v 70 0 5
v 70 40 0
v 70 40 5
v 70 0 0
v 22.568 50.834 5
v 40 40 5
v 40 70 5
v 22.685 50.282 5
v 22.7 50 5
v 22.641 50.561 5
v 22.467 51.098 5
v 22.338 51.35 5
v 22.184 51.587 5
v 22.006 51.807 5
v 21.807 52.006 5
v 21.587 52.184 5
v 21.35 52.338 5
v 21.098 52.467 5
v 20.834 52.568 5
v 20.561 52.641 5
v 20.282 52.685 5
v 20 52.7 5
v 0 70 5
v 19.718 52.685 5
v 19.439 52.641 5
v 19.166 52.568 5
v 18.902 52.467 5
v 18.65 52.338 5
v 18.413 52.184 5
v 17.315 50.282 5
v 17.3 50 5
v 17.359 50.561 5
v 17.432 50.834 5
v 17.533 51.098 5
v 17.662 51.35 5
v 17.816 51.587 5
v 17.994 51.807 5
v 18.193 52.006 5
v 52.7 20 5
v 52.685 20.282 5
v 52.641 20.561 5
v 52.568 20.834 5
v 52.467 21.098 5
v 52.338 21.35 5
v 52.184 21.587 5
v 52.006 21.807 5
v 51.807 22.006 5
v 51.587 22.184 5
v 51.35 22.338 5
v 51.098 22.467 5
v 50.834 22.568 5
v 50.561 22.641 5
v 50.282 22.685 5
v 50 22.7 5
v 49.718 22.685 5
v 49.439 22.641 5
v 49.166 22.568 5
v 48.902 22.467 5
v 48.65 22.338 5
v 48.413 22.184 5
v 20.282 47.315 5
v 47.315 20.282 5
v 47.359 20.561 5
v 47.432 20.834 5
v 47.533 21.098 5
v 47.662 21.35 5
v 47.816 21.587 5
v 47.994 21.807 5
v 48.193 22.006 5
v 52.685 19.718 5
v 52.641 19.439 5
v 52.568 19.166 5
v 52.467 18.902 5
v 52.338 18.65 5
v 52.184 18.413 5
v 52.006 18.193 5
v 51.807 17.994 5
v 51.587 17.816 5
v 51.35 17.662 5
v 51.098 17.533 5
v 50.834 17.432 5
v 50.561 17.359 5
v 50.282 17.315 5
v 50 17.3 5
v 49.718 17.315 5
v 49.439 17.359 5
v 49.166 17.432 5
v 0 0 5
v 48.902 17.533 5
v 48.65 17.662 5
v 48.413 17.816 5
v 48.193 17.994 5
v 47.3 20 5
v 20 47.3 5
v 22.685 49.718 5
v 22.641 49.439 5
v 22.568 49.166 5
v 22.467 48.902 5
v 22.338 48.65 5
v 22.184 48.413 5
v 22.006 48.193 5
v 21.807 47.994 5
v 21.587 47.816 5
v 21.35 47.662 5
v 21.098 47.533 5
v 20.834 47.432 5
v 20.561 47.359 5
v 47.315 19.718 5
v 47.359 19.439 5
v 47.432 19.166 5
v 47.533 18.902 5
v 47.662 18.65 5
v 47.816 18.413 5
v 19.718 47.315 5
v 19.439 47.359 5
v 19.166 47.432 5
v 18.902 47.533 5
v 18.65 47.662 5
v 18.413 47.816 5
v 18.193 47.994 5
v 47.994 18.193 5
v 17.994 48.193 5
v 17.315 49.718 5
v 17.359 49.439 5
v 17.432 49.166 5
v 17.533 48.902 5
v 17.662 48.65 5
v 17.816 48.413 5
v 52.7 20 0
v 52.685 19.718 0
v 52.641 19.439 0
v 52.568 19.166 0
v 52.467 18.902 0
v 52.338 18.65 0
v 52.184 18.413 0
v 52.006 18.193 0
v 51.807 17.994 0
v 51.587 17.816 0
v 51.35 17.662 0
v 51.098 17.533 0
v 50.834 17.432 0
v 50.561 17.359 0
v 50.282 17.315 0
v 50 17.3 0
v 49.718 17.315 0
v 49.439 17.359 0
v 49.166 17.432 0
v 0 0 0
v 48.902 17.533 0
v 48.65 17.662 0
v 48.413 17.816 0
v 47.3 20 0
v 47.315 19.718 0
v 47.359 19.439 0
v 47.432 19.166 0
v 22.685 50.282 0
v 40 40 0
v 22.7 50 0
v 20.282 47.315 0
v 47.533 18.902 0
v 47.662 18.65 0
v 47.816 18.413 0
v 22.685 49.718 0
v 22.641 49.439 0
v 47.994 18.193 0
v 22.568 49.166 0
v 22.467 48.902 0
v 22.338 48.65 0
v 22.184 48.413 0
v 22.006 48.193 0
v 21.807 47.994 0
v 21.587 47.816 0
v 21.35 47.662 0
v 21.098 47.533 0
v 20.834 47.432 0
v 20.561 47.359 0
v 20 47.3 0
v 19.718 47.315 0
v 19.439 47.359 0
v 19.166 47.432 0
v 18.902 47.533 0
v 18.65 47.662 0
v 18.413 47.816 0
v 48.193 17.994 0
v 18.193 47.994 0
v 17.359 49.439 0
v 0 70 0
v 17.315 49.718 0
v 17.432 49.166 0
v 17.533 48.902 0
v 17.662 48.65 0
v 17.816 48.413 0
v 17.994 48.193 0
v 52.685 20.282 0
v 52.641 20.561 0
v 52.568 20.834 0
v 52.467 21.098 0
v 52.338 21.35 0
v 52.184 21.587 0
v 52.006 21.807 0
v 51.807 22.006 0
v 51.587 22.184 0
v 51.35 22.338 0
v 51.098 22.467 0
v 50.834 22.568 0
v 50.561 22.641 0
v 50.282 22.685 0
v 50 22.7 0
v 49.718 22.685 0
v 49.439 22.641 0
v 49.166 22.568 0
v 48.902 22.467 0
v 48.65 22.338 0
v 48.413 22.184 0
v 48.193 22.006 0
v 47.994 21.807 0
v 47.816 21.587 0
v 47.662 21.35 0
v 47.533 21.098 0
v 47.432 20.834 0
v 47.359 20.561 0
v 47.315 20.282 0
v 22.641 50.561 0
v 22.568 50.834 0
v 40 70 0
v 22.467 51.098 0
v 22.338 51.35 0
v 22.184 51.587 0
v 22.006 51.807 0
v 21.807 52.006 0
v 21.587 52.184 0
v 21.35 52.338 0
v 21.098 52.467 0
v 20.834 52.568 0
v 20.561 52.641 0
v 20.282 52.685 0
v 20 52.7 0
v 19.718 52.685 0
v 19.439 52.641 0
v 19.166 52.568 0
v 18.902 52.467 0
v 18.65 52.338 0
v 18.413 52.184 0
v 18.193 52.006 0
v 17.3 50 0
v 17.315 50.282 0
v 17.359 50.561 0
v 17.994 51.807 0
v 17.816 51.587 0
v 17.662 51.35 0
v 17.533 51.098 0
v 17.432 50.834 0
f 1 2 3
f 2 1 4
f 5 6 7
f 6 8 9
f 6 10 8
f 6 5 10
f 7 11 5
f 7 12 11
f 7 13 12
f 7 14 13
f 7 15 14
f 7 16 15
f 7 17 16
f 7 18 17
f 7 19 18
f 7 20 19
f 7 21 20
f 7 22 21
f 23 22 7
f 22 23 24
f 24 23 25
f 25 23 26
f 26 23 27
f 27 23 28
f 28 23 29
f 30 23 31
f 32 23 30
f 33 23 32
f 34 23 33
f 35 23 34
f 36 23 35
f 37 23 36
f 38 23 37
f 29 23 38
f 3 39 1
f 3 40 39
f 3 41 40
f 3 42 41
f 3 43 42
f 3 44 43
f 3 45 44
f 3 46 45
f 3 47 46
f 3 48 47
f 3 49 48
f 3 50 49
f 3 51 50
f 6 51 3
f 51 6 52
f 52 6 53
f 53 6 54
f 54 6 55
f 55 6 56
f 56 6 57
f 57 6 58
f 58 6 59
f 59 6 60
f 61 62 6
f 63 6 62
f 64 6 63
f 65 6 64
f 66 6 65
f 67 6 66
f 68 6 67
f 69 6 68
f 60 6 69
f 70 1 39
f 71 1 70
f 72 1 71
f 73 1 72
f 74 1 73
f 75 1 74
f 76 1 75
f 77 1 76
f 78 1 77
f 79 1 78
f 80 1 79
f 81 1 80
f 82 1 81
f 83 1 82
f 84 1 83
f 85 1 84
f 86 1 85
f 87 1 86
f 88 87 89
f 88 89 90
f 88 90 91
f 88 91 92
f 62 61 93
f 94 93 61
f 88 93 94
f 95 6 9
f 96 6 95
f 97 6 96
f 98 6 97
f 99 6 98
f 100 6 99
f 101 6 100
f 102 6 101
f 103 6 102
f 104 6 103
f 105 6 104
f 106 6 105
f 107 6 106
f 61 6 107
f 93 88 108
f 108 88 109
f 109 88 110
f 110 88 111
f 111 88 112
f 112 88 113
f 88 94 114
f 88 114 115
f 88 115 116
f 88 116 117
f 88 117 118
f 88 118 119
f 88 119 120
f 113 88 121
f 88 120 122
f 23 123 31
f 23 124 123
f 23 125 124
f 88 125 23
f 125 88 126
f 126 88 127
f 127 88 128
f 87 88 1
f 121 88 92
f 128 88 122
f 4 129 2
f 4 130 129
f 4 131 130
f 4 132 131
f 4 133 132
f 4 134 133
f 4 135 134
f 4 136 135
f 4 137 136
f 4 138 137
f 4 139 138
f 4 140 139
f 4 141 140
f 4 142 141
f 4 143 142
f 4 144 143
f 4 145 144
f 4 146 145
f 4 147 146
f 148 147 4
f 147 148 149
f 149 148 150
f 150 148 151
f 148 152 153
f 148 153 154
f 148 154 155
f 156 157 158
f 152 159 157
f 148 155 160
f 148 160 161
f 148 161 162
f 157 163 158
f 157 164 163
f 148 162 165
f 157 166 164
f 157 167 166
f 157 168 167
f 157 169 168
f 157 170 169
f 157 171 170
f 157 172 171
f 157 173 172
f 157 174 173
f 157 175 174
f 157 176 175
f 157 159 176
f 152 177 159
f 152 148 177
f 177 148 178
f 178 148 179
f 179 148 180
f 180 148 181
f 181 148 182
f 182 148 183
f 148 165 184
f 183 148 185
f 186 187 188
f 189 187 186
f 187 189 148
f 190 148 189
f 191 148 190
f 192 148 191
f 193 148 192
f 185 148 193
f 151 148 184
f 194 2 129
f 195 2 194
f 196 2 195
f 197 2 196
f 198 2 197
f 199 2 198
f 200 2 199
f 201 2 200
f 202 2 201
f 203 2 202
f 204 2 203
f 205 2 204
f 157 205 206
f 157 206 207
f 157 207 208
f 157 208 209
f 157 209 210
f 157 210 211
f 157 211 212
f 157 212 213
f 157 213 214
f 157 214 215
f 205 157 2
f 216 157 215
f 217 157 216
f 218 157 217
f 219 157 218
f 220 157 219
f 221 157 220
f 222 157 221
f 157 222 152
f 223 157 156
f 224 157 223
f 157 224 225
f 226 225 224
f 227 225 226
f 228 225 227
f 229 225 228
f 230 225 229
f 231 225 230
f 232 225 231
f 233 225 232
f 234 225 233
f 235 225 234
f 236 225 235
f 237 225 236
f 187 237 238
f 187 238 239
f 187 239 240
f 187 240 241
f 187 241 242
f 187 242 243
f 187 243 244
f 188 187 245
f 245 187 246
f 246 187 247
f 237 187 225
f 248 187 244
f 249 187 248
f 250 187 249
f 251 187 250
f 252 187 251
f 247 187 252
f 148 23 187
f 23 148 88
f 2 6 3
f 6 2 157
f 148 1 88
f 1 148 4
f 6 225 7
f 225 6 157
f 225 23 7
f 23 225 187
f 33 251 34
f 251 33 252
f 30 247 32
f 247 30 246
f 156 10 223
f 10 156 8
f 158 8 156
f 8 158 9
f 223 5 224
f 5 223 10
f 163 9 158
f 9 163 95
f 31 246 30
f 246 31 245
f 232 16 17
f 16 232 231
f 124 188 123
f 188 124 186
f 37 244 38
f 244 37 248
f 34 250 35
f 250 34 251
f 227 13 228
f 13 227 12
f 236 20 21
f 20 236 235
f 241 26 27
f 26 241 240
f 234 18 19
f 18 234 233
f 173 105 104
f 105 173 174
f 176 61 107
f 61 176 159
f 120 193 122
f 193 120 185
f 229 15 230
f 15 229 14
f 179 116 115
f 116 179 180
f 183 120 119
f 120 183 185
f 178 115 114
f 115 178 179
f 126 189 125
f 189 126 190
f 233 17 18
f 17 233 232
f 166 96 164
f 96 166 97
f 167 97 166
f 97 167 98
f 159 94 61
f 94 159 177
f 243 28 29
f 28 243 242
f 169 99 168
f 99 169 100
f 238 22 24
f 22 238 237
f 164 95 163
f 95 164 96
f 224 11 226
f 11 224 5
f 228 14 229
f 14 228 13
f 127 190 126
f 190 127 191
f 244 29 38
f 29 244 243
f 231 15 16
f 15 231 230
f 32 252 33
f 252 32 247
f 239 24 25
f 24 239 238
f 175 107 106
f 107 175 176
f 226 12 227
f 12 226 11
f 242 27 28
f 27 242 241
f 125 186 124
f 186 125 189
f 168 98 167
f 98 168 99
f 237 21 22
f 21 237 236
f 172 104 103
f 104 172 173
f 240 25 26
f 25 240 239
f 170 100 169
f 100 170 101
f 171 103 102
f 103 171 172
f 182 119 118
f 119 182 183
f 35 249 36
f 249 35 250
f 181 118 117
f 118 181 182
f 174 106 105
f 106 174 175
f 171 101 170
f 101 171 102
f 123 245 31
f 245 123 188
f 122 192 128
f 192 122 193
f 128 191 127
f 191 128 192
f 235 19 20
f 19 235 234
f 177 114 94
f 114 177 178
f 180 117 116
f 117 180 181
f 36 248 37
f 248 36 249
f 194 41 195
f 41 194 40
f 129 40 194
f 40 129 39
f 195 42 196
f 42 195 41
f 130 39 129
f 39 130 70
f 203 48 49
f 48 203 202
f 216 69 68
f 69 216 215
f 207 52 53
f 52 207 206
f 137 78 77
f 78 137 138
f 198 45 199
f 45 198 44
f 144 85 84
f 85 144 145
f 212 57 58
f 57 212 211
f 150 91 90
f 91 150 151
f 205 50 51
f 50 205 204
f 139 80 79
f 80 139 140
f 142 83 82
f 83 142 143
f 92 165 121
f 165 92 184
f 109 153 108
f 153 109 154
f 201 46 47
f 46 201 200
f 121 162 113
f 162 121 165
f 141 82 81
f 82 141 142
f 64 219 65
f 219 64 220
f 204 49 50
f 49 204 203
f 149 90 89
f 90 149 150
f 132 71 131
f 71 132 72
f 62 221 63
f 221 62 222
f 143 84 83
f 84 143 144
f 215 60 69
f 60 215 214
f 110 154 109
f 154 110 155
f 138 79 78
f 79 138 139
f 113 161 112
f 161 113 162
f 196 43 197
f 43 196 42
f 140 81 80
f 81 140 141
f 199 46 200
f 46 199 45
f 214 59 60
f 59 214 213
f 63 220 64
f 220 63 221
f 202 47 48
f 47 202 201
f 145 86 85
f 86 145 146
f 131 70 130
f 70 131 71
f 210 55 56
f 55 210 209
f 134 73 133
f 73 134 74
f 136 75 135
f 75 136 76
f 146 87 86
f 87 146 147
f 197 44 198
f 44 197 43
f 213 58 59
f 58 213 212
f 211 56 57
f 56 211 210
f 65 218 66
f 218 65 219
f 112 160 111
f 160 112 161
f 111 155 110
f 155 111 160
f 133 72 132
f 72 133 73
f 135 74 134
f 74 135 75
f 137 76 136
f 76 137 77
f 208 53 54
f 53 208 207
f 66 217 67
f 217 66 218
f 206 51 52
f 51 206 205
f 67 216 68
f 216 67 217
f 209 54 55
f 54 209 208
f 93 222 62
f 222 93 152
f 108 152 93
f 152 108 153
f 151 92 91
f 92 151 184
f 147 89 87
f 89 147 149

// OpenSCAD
// V-slot corner connector.
$fn = 60;
eps = 0.02;
profile = 40;
arm = 70;
plate_t = 5;
difference() {
    union() { cube([arm,profile,plate_t]); cube([profile,arm,plate_t]); }
    for (p=[[profile/2,arm-profile/2],[arm-profile/2,profile/2]]) translate([p[0],p[1],-eps]) cylinder(d=5.4,h=plate_t+2*eps);
}
